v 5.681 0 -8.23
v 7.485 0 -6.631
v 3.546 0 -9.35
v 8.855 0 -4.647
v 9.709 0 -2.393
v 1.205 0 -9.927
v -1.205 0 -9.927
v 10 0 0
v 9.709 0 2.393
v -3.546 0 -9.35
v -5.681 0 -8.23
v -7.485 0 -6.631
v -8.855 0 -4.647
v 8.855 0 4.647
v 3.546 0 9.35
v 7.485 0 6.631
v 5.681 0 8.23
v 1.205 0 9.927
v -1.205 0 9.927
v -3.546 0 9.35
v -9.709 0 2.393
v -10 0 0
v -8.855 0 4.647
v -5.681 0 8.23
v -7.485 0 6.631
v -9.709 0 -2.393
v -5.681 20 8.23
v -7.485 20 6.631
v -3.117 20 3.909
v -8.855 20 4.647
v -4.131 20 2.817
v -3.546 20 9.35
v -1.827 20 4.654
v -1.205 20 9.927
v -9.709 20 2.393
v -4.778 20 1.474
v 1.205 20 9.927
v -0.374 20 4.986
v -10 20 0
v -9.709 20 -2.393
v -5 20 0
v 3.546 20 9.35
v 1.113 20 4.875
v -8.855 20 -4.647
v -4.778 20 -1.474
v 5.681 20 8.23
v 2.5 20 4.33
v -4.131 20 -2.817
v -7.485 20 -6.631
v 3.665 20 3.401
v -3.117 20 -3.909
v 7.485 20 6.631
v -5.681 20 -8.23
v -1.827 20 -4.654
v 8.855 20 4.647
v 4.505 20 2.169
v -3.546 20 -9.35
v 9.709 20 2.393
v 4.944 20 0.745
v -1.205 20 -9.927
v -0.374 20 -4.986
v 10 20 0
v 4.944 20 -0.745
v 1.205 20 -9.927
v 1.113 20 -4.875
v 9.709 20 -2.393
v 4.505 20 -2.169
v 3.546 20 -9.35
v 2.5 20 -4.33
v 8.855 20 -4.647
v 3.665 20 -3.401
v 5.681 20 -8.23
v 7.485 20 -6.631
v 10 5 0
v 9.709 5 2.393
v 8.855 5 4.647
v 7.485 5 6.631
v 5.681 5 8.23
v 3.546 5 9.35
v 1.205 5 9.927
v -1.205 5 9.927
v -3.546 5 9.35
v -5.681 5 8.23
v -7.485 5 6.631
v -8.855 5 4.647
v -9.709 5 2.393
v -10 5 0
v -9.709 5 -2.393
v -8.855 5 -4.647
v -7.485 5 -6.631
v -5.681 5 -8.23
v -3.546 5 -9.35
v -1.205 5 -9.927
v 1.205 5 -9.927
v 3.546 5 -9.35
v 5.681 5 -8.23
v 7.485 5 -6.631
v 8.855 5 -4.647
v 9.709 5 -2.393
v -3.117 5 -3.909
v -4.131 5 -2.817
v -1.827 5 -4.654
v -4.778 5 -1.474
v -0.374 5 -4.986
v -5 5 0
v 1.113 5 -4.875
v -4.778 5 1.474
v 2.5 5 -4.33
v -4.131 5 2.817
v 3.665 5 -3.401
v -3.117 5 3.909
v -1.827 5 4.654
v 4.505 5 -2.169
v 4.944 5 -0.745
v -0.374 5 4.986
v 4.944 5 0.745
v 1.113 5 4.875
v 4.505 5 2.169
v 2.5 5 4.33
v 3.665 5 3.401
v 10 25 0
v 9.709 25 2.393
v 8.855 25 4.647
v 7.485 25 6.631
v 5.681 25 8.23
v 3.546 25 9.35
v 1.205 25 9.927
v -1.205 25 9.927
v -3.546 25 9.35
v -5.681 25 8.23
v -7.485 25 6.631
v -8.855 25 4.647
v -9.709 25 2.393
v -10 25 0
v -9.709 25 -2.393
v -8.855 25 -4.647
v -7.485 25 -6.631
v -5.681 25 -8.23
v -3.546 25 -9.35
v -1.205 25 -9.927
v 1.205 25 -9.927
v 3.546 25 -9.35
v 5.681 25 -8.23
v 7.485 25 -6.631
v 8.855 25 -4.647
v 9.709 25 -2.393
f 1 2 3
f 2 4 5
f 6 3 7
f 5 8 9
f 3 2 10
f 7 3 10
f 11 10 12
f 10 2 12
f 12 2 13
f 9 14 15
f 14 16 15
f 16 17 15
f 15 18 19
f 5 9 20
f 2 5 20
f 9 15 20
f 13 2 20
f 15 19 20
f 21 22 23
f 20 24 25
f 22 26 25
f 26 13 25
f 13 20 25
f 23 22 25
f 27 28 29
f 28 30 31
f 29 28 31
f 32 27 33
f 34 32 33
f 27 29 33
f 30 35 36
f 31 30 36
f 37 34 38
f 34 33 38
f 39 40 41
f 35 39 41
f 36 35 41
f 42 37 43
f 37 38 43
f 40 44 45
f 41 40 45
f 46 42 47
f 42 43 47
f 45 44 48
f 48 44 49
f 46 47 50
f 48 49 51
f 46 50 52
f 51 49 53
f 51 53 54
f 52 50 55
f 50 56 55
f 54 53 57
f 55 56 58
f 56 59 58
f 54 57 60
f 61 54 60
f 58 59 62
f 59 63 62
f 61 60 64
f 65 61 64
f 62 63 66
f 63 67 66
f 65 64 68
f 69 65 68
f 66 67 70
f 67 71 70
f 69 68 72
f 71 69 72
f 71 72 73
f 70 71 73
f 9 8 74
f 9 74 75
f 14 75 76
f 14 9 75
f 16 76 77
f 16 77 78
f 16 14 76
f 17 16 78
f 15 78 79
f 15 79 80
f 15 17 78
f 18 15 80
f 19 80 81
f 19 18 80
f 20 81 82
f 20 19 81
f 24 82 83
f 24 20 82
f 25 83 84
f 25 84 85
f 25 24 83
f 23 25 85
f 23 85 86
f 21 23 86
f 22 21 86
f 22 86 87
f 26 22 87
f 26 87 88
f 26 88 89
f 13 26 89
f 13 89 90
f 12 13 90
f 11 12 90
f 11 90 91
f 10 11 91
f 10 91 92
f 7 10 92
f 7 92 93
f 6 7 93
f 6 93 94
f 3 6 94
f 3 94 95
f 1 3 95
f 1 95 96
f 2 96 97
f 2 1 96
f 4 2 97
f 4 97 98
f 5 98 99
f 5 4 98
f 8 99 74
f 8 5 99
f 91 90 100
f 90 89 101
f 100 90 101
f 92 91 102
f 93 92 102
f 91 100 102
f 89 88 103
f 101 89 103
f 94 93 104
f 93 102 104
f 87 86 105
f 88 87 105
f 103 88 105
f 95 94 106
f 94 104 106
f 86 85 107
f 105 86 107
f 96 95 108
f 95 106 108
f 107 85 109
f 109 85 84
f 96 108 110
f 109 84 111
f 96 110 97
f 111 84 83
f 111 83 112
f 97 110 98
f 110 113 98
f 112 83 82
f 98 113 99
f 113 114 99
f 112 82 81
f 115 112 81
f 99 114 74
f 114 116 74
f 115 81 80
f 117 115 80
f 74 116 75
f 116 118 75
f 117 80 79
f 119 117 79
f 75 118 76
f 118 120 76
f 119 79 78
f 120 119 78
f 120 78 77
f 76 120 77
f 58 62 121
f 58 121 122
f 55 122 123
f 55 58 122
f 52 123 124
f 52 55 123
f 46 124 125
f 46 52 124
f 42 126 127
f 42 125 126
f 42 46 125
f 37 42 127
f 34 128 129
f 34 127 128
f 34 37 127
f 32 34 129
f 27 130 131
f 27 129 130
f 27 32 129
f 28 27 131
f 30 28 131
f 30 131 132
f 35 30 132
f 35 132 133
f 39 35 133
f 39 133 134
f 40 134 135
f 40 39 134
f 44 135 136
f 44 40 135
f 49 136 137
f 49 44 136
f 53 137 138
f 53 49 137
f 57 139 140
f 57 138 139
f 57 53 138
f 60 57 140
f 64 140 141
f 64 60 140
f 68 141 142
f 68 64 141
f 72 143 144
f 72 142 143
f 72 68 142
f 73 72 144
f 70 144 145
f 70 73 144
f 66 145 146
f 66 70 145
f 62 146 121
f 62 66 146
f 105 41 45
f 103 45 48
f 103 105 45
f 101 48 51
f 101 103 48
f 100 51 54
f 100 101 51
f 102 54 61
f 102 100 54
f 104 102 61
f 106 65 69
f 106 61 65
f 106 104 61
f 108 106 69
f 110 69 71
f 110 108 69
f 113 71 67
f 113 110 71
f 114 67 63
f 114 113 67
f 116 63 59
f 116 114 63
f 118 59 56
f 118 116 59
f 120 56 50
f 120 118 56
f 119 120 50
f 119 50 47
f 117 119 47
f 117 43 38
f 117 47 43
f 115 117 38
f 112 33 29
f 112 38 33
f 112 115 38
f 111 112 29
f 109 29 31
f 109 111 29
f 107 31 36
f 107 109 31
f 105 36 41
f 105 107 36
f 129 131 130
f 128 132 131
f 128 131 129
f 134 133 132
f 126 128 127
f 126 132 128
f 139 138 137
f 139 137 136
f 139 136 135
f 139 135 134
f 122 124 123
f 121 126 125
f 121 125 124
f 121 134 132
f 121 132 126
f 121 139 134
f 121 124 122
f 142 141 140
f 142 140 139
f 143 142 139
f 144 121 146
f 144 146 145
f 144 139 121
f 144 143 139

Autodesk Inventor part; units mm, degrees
ref_plane "YZ Plane" through (0, 0, 0) normal (1, 0, 0) x (0, 1, 0)
ref_plane "XZ Plane" through (0, 0, 0) normal (0, 1, 0) x (-1, 0, 0)
ref_plane "XY Plane" through (0, 0, 0) normal (0, 0, 1) x (1, 0, 0)
sketch "Szkic1" plane through (0, 0, 0) normal (0, 1, 0) x (-1, 0, 0)
  circle A0 centre (0, 0) radius 5
  dimension "d0" = 10
extrude "Wyciągnięcie proste1" add sketch "Szkic1" along normal blind 20
sketch "Szkic2" plane through (0, 0, 0) normal (0, -1, 0) x (1, 0, 0)
  circle A0 centre (0, 0) radius 10
  dimension "d3" = 20
extrude "Wyciągnięcie proste2" add sketch "Szkic2" against normal blind 5
sketch "Szkic3" plane through (0, 20, 0) normal (0, 1, 0) x (1, 0, 0)
  circle A0 centre (0, 0) radius 10
extrude "Wyciągnięcie proste3" add sketch "Szkic3" along normal blind 5
properties part number "dopodniesienia1"
